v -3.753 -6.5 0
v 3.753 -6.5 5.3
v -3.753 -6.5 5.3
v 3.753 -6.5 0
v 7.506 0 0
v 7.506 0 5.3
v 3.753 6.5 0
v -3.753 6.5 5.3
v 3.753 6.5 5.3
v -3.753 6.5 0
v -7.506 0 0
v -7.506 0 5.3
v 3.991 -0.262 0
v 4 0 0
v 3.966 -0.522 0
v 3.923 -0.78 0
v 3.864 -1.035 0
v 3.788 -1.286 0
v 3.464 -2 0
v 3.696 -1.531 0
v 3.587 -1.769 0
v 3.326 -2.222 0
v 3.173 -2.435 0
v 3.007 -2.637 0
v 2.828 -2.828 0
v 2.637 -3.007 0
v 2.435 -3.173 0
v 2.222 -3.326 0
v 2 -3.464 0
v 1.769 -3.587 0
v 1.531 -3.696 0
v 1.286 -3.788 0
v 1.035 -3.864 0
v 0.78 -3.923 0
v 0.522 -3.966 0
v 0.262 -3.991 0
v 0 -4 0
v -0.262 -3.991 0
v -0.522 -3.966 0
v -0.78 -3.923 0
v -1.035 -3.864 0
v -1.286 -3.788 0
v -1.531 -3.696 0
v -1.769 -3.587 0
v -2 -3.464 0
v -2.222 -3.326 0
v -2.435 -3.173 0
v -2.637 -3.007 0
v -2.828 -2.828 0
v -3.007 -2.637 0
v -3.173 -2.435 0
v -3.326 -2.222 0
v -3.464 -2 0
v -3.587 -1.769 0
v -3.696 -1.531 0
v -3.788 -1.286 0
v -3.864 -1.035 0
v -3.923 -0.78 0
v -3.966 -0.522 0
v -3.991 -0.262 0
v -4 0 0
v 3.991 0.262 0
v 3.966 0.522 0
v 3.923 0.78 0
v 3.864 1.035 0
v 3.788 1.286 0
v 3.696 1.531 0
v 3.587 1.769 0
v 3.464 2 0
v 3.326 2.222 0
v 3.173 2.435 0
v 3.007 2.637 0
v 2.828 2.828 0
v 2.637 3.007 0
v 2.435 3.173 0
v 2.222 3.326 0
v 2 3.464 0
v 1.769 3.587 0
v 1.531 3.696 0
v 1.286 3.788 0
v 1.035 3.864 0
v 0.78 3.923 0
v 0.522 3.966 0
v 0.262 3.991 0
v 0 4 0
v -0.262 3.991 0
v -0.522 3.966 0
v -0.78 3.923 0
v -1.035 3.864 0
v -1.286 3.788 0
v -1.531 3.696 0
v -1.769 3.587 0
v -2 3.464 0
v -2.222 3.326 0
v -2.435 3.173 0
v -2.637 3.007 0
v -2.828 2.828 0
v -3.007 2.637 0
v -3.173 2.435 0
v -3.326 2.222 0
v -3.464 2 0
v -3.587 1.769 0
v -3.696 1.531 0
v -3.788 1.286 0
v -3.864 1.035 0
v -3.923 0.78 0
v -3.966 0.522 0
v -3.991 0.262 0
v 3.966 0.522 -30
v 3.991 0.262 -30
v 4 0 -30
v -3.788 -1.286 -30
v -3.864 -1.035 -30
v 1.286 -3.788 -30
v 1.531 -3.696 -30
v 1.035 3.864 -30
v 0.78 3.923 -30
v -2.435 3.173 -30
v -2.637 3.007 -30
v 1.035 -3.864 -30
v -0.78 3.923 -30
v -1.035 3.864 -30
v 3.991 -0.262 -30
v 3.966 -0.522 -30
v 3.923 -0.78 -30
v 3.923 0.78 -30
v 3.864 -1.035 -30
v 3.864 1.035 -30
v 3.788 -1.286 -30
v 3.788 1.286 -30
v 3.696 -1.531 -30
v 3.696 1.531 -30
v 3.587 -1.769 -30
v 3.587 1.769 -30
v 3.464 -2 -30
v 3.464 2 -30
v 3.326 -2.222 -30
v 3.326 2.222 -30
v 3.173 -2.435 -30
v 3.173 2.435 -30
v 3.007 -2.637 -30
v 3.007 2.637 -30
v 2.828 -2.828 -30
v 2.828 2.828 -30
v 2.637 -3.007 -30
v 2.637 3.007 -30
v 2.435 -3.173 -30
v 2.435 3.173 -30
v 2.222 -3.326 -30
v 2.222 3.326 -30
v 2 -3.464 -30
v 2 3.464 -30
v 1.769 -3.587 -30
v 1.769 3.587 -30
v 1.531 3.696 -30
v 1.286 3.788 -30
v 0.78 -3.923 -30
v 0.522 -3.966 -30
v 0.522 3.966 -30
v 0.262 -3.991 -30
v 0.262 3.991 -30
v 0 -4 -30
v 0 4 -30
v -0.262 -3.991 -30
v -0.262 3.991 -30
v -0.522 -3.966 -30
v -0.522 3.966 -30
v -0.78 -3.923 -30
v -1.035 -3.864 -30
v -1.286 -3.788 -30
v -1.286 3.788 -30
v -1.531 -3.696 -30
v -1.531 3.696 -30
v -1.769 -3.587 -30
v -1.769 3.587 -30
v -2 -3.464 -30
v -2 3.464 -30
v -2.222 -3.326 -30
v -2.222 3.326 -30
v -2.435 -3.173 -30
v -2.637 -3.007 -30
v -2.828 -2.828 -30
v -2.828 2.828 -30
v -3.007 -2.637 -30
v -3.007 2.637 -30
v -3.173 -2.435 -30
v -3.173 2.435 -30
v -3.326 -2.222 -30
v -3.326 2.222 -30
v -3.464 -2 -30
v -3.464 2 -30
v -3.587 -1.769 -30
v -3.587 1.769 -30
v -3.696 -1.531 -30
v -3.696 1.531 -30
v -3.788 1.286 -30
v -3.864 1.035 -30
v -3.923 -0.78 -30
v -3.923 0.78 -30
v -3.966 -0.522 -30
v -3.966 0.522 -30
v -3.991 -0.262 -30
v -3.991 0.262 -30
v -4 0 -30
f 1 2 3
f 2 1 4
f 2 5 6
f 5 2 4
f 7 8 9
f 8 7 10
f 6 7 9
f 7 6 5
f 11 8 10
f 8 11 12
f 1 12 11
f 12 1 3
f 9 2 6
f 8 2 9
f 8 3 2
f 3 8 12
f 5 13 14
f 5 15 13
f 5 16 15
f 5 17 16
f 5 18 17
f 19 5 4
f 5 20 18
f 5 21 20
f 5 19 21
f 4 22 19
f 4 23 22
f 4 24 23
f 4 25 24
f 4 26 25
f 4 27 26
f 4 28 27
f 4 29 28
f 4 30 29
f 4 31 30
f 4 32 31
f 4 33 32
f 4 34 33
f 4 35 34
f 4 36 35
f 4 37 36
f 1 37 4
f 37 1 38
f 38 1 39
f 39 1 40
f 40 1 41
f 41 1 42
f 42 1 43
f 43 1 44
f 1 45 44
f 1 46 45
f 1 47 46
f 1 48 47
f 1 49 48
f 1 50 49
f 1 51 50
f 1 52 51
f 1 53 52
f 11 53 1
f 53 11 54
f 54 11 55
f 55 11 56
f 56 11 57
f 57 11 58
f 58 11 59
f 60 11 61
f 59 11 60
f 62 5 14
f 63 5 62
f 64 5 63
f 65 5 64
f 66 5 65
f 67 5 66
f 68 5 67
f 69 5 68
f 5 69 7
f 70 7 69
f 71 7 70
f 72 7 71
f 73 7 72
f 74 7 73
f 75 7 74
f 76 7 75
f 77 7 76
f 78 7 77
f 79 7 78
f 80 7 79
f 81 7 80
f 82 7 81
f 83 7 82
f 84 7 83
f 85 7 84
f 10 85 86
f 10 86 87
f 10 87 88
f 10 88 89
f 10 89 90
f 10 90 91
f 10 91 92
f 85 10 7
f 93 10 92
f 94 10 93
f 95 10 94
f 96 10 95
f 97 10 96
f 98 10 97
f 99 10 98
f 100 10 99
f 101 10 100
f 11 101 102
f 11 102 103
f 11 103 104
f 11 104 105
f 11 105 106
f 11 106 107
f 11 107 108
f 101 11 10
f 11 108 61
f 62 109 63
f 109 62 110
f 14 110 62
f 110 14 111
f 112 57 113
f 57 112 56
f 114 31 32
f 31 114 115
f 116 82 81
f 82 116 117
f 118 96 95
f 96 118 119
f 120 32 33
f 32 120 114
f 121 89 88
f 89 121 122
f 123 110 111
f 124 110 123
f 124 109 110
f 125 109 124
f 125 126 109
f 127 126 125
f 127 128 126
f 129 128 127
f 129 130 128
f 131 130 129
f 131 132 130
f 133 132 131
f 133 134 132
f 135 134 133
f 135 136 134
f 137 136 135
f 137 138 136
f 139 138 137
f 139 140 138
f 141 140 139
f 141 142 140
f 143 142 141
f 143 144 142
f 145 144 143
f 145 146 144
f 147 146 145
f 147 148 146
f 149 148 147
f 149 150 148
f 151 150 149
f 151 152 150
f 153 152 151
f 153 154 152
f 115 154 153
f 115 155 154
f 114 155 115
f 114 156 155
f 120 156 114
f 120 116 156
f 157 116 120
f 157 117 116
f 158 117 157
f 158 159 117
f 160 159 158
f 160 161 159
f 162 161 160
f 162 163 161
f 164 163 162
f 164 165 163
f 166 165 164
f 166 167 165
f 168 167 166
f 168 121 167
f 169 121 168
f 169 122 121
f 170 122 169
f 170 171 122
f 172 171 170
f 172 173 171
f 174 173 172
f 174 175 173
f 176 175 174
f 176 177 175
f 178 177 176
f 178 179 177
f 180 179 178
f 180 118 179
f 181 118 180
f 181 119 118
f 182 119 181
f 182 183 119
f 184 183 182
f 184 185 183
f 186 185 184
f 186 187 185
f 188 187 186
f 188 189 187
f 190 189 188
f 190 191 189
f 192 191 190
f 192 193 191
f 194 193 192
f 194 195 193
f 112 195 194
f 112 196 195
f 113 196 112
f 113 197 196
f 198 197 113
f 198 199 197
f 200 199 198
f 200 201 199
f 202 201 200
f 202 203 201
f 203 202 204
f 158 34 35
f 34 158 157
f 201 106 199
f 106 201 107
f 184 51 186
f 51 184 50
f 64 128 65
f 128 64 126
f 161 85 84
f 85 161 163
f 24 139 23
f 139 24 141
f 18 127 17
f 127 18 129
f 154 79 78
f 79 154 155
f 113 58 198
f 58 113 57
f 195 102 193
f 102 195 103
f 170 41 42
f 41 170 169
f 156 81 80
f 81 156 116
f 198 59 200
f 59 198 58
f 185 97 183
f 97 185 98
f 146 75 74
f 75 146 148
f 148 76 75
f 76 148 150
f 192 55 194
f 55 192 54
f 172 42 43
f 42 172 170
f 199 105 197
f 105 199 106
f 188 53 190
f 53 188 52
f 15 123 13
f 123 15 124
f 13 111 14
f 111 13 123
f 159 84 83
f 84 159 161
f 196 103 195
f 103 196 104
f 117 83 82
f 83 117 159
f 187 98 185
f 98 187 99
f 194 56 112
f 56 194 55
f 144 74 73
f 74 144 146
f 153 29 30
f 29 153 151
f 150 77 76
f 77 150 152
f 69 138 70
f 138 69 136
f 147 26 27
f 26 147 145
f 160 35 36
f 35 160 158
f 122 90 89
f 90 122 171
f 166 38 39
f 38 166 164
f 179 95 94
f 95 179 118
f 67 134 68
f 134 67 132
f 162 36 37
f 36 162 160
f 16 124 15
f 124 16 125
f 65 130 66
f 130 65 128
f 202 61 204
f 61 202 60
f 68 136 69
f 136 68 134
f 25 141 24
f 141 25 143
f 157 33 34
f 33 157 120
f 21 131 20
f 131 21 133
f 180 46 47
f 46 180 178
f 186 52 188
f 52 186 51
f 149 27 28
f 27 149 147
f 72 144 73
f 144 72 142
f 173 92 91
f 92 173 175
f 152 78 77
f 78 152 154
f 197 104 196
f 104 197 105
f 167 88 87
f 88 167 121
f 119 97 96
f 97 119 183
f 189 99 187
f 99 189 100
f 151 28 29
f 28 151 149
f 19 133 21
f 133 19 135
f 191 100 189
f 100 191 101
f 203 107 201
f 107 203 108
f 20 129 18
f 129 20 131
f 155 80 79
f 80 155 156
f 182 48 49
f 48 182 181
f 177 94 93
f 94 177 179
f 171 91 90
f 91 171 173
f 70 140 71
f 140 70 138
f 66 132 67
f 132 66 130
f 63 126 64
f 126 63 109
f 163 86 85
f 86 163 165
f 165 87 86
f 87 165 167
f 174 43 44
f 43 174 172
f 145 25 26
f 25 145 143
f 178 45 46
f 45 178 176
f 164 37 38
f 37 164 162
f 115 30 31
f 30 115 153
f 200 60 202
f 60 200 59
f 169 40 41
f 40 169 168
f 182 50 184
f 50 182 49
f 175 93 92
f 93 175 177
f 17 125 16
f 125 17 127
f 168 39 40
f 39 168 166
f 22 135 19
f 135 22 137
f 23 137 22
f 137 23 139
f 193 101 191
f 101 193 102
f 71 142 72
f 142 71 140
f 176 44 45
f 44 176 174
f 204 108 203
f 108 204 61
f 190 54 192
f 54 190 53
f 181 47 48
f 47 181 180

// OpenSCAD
head_af = 13;
head_height = 5.3;
shank_diameter = 8;
shank_length = 30;

union() {
    cylinder(
        h = head_height,
        r = head_af / sqrt(3),
        $fn = 6
    );

    translate([0, 0, -shank_length])
        cylinder(
            h = shank_length,
            d = shank_diameter,
            $fn = 96
        );
}
